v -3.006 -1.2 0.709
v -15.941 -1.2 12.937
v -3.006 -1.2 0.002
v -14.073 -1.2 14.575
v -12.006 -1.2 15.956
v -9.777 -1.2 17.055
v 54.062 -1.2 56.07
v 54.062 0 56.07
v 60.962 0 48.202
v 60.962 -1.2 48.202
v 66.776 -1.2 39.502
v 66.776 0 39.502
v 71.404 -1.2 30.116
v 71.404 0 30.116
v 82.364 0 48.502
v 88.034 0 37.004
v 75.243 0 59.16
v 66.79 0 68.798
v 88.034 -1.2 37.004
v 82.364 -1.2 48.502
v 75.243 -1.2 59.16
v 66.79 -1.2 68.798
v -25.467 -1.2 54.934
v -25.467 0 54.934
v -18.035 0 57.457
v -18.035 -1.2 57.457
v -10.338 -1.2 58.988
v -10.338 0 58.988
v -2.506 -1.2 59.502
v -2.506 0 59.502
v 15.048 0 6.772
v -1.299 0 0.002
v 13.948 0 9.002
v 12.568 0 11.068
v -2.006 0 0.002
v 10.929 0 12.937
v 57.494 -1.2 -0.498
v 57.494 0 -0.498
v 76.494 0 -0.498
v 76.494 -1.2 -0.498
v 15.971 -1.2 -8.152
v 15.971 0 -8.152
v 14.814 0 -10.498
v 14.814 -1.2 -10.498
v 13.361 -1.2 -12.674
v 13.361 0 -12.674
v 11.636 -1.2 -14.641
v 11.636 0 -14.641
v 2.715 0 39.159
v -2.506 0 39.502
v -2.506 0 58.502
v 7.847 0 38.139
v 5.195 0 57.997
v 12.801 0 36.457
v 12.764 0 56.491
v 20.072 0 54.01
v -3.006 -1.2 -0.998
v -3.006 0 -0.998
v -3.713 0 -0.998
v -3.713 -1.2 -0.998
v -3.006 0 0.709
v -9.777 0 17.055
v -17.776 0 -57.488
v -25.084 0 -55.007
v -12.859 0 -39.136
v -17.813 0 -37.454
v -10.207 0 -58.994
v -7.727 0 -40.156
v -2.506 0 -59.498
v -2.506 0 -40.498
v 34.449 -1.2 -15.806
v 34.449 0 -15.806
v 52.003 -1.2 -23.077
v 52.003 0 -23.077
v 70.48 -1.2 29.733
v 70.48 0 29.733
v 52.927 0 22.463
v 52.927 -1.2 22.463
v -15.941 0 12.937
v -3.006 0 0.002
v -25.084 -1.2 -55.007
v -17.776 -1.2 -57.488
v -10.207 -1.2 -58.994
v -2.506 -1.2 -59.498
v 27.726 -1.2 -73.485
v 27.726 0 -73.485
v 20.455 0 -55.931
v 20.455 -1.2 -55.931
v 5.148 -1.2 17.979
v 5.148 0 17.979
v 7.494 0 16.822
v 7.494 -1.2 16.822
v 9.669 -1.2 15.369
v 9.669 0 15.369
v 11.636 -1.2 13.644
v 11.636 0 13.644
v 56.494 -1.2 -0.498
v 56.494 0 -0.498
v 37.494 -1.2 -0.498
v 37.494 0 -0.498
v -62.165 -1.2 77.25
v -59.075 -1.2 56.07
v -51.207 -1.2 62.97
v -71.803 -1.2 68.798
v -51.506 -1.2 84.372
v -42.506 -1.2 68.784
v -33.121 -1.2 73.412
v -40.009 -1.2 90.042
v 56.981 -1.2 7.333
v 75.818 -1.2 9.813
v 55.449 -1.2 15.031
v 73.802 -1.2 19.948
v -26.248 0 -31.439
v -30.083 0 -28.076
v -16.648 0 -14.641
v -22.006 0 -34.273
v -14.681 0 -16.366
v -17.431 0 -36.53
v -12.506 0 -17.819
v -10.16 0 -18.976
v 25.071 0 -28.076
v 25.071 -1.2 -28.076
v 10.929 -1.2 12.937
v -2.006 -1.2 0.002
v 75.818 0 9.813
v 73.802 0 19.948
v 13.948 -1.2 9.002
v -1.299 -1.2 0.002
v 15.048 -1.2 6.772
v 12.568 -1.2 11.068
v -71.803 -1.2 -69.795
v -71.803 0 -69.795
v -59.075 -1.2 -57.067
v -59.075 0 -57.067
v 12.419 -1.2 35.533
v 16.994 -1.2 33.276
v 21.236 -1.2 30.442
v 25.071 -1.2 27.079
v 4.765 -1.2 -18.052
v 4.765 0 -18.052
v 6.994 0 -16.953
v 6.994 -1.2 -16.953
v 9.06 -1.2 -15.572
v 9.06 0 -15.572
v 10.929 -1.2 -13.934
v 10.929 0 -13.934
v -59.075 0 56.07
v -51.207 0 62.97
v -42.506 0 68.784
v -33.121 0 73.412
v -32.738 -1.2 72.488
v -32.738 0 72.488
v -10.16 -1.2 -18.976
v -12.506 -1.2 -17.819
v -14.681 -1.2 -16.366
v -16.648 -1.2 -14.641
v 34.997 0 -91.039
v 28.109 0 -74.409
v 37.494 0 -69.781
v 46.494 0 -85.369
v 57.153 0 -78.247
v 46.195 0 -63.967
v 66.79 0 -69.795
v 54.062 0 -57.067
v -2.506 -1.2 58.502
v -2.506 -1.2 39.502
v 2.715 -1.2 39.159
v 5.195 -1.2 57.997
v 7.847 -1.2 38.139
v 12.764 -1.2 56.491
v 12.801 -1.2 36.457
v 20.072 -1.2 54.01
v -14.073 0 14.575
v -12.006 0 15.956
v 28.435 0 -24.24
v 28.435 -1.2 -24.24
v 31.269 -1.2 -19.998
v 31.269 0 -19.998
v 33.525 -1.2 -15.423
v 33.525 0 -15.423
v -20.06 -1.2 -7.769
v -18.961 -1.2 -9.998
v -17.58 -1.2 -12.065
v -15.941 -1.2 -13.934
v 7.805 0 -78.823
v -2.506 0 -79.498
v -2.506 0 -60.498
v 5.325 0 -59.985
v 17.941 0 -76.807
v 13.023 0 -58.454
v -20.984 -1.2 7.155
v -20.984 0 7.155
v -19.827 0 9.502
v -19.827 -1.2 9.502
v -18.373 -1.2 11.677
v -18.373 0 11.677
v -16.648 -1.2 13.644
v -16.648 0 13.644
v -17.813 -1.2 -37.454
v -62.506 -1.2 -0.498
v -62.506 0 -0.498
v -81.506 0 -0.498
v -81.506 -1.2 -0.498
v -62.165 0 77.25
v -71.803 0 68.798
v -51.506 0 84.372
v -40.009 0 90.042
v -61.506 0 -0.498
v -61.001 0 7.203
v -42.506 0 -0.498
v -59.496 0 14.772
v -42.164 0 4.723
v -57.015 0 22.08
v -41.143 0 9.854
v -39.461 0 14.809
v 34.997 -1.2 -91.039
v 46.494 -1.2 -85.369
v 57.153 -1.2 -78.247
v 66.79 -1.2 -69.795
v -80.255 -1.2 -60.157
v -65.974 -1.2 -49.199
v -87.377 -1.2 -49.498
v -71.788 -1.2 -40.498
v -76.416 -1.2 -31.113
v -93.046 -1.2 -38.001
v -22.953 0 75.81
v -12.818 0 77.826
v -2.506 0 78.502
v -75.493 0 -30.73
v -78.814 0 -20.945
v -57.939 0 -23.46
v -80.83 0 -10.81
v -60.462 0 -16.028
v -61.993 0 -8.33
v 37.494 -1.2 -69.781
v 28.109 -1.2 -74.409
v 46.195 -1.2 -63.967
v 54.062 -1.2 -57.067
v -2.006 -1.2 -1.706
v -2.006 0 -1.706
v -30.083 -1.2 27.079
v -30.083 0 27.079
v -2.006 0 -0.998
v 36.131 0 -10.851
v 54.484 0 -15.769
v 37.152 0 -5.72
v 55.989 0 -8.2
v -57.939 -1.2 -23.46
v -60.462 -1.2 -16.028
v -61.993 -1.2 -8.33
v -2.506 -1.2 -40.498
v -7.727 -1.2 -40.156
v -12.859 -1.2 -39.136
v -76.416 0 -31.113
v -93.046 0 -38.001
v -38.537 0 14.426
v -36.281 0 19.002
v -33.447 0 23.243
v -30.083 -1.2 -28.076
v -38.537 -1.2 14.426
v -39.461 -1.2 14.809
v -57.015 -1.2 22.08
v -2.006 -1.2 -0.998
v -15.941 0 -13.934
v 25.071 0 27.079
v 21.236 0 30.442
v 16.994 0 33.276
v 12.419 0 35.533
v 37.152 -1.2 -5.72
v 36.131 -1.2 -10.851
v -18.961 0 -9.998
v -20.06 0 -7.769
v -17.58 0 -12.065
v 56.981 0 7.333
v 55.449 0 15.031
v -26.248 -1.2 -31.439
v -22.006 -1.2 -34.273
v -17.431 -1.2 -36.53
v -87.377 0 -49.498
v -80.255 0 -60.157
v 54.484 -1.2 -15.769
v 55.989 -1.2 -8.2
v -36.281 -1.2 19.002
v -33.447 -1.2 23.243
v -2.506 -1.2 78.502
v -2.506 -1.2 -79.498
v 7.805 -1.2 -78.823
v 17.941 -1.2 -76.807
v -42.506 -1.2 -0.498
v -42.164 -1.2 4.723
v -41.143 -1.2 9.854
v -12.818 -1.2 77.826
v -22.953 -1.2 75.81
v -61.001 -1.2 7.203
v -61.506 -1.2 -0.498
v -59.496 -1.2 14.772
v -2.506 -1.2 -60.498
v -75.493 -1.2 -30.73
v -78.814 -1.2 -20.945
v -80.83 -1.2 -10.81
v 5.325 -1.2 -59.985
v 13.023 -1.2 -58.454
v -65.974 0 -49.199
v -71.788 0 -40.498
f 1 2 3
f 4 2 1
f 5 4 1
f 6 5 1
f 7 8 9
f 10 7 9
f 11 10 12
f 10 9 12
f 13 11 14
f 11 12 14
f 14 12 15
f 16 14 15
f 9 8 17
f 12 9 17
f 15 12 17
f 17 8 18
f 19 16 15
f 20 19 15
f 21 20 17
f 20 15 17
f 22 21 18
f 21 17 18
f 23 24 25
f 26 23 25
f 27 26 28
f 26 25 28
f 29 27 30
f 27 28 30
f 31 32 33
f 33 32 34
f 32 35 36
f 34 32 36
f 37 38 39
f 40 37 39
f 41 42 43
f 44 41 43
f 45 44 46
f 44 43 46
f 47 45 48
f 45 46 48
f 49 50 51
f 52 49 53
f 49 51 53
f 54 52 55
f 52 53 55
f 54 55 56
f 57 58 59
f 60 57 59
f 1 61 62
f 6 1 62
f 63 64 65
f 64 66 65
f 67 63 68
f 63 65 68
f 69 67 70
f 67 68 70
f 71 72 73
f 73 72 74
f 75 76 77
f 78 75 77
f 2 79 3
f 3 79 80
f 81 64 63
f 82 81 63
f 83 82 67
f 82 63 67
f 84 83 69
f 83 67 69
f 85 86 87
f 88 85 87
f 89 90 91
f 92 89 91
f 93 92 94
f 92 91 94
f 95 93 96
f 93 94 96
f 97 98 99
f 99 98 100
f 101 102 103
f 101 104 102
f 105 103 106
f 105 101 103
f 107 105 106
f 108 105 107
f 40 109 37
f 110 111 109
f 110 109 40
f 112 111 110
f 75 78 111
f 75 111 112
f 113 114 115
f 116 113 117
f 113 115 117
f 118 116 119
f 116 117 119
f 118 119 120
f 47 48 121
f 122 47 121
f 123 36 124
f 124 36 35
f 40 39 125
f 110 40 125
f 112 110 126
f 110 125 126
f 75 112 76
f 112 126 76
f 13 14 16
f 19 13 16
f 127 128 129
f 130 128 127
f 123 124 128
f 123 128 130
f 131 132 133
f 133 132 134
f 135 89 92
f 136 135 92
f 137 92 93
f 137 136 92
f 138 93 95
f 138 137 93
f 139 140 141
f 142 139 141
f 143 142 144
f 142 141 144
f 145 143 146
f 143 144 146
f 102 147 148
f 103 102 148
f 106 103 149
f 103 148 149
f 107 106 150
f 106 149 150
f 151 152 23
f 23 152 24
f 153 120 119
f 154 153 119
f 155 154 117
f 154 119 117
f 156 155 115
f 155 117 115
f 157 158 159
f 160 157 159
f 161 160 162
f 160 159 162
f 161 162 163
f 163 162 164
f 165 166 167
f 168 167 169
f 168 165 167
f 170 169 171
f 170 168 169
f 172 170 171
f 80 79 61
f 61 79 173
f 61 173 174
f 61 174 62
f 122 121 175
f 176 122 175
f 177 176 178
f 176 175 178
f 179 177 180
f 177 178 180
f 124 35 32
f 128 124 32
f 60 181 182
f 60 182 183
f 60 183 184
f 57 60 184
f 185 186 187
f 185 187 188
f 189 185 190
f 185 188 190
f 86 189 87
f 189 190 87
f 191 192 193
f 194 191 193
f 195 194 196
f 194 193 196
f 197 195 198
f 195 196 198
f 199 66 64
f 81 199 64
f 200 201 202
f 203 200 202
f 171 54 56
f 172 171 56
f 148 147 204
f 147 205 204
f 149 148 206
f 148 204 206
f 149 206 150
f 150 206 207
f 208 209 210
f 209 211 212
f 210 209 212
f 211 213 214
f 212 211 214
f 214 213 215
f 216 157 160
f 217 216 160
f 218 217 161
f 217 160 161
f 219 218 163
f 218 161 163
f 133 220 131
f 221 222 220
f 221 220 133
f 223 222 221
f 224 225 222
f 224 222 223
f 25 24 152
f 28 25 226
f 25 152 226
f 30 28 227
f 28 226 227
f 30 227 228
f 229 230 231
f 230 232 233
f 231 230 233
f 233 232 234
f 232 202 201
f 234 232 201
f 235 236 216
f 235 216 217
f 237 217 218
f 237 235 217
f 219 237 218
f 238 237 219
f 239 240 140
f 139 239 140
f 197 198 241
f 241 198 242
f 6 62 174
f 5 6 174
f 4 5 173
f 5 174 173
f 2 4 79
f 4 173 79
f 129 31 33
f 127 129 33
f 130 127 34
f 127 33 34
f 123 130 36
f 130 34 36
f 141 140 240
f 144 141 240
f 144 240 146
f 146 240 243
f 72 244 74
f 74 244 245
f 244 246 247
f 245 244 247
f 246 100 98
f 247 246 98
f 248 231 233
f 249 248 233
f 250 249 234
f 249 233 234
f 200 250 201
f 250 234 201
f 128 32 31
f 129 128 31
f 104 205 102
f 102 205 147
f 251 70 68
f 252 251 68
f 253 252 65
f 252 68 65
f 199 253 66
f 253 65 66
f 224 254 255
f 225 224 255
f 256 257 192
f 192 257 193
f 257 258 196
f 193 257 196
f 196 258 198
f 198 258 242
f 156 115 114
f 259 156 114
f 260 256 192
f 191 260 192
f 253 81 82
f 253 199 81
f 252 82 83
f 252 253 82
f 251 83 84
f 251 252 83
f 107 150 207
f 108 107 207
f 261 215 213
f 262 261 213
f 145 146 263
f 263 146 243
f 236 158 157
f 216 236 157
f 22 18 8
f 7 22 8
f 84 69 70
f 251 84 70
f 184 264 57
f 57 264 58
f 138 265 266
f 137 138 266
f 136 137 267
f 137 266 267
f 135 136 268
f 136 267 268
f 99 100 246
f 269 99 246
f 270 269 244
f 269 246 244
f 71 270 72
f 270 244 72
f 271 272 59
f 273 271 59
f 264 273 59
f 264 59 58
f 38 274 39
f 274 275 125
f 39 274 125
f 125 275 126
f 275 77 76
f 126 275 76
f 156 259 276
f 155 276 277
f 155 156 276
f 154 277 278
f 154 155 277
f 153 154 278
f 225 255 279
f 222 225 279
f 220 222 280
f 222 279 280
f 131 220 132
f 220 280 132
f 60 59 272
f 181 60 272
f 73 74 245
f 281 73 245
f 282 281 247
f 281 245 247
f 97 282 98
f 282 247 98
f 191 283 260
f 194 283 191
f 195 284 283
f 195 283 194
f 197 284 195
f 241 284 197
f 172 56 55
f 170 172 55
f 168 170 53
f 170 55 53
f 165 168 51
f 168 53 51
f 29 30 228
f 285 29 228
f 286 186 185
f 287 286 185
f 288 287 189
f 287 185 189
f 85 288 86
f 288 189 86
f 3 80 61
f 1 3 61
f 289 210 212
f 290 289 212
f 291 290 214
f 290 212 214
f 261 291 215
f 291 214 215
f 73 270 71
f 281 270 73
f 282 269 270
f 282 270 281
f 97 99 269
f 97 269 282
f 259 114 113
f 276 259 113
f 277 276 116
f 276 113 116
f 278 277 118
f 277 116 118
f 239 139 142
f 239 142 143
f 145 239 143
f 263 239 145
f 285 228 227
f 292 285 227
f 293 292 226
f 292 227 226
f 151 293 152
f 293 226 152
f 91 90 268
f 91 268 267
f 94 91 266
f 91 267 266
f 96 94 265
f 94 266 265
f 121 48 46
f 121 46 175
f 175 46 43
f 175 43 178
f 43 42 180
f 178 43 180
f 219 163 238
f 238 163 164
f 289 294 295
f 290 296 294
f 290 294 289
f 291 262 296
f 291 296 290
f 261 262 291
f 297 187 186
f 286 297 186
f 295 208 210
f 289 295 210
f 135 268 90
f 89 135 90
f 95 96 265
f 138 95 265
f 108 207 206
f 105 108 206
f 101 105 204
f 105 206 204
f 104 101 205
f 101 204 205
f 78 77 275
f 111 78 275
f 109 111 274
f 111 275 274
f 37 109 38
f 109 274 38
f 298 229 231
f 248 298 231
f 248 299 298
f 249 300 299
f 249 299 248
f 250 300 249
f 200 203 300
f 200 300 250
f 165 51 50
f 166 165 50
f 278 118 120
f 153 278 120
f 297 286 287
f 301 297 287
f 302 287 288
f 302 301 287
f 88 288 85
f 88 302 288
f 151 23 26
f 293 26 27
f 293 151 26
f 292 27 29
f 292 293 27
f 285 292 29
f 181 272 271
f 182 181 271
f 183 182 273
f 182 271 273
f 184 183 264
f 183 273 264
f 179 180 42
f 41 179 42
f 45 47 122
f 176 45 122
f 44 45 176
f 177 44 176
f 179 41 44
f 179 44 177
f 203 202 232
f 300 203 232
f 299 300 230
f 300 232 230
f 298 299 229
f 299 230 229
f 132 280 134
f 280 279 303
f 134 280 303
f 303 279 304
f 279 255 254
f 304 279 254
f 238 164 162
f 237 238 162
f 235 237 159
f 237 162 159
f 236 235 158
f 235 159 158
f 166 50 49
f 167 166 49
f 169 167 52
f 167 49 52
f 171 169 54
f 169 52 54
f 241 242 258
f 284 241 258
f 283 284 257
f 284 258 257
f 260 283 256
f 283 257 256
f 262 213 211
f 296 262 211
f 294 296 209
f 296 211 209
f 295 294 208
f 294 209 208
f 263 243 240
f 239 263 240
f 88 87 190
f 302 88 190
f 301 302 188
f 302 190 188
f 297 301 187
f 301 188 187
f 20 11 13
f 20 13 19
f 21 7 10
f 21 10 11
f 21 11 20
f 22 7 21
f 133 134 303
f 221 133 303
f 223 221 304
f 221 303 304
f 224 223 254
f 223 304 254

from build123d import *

# Parameters (mm, degrees)
F1_DEPTH = 1.2


# Not quite as in the source:
# - ends of sketch curves that miss each other by under 0.0002 mm in the source are joined


with BuildPart() as f1:
    # F0 (on Front) → F1 (new body)
    with BuildSketch(Plane.XZ):
        with BuildLine():
            Line((-1.2989994546, 0.0015044786), (15.0476048994, 6.7724896142))
            ThreePointArc((15.0476048994, 6.7724896142), (13.2918164287, 10.0573388369), (10.928922648, 12.9365332644))
            Line((10.928922648, 12.9365332644), (-2.0061062491, 0.0015044765))
            Line((-2.0061062498, 0.0015044786), (-1.2989994546, 0.0015044786))
        make_face()
    extrude(amount=F1_DEPTH)


with BuildPart() as f1b:
    # F0 (on Front) → F1, piece 2 (new body)
    with BuildSketch(Plane.XZ):
        with BuildLine():
            Line((11.6360294322, 13.6436400426), (25.0710583314, 27.0786688285))
            ThreePointArc((25.0710583314, 27.0786688285), (19.1611329685, 31.9288192702), (12.4185477522, 35.532806188))
            Line((12.4185477522, 35.532806188), (5.1475624685, 17.9790950988))
            ThreePointArc((5.1475624685, 17.9790950988), (8.6052984769, 16.1308966794), (11.6360294322, 13.6436400426))
        make_face()
    extrude(amount=F1_DEPTH)


with BuildPart() as f1c:
    # F0 (on Front) → F1, piece 3 (new body)
    with BuildSketch(Plane.XZ):
        with BuildLine():
            Line((12.8012311882, 36.4566857191), (20.0722164719, 54.0103968083))
            ThreePointArc((20.0722164719, 54.0103968083), (9.0042229134, 57.3678359894), (-2.5061061445, 58.5015044786))
            Line((-2.5061061445, 58.5015044786), (-2.5061062512, 39.5015044786))
            ThreePointArc((-2.5061062512, 39.5015044786), (5.2975067418, 38.7329156724), (12.8012311882, 36.4566857191))
        make_face()
    extrude(amount=F1_DEPTH)


with BuildPart() as f1d:
    # F0 (on Front) → F1, piece 4 (new body)
    with BuildSketch(Plane.XZ):
        with BuildLine():
            Line((-2.5061062512, 59.5015044786), (-2.5061062512, 78.5015044786))
            ThreePointArc((-2.5061062512, 78.5015044786), (-17.918241492, 76.9835416699), (-32.7380971661, 72.4879876471))
            Line((-32.7380971661, 72.4879876471), (-25.4671120094, 54.9342765053))
            ThreePointArc((-25.4671120094, 54.9342765053), (-14.2115254214, 58.3486213327), (-2.5061062512, 59.5015044786))
        make_face()
    extrude(amount=F1_DEPTH)


with BuildPart() as f1e:
    # F0 (on Front) → F1, piece 5 (new body)
    with BuildSketch(Plane.XZ):
        with BuildLine():
            ThreePointArc((-59.0746485757, 56.0700471439), (-46.9517246823, 66.0190736034), (-33.1207805954, 73.4118671809))
            Line((-33.1207805954, 73.4118671809), (-40.0090823229, 90.041698789))
            ThreePointArc((-40.0090823229, 90.041698789), (-56.9519888293, 80.9855266564), (-71.8025705987, 68.7979692436))
            Line((-71.8025705987, 68.7979692436), (-59.0746485757, 56.0700471439))
        make_face()
    extrude(amount=F1_DEPTH)


with BuildPart() as f1f:
    # F0 (on Front) → F1, piece 6 (new body)
    with BuildSketch(Plane.XZ):
        with BuildLine():
            Line((-15.9411350532, 12.9365333616), (-3.0061062497, 0.0015044801))
            Line((-3.0061062512, 0.0015044796), (-3.0061062512, 0.7086112711))
            Line((-3.0061062512, 0.7086112711), (-9.7770914079, 17.0552156204))
            ThreePointArc((-9.7770914079, 17.0552156204), (-13.0619406286, 15.2994271457), (-15.9411350532, 12.9365333616))
        make_face()
    extrude(amount=F1_DEPTH)


with BuildPart() as f1g:
    # F0 (on Front) → F1, piece 7 (new body)
    with BuildSketch(Plane.XZ):
        with BuildLine():
            Line((-16.6482418323, 13.6436401449), (-30.0832706344, 27.0786690279))
            ThreePointArc((-30.0832706344, 27.0786690279), (-34.933421069, 21.1687436591), (-38.5374079786, 14.4261584385))
            Line((-38.5374079786, 14.4261584385), (-20.9836968806, 7.155173176))
            ThreePointArc((-20.9836968806, 7.155173176), (-19.1354984654, 10.6129091865), (-16.6482418323, 13.6436401449))
        make_face()
    extrude(amount=F1_DEPTH)


with BuildPart() as f1h:
    # F0 (on Front) → F1, piece 8 (new body)
    with BuildSketch(Plane.XZ):
        with BuildLine():
            Line((-39.4612875101, 14.8088418734), (-57.0149986081, 22.0798271359))
            ThreePointArc((-57.0149986081, 22.0798271359), (-60.3724377655, 11.0118336257), (-61.5061062512, -0.4984953792))
            Line((-61.5061062512, -0.4984953792), (-42.5061062512, -0.498495425))
            ThreePointArc((-42.5061062512, -0.498495425), (-41.7375174473, 7.3051174597), (-39.4612875101, 14.8088418734))
        make_face()
    extrude(amount=F1_DEPTH)


with BuildPart() as f1i:
    # F0 (on Front) → F1, piece 9 (new body)
    with BuildSketch(Plane.XZ):
        with BuildLine():
            ThreePointArc((-81.5061062512, -0.498495331), (-79.9881434379, -15.9106307856), (-75.4925893833, -30.7304865244))
            Line((-75.4925893833, -30.7304865244), (-57.9388782503, -23.4595013464))
            ThreePointArc((-57.9388782503, -23.4595013464), (-61.3532231018, -12.2039147094), (-62.5061062512, -0.4984953768))
            Line((-62.5061062512, -0.4984953768), (-81.5061062512, -0.498495331))
        make_face()
    extrude(amount=F1_DEPTH)


with BuildPart() as f1j:
    # F0 (on Front) → F1, piece 10 (new body)
    with BuildSketch(Plane.XZ):
        with BuildLine():
            Line((-71.8025709327, -69.7949599525), (-59.0746488484, -57.0670379141))
            ThreePointArc((-59.0746488484, -57.0670379141), (-69.0236753224, -44.9441140327), (-76.4164689166, -31.1131699548))
            Line((-76.4164689166, -31.1131699548), (-93.0463005164, -38.0014717023))
            ThreePointArc((-93.0463005164, -38.0014717023), (-83.9901283634, -54.9443781978), (-71.8025709327, -69.7949599525))
        make_face()
    extrude(amount=F1_DEPTH)


with BuildPart() as f1k:
    # F0 (on Front) → F1, piece 11 (new body)
    with BuildSketch(Plane.XZ):
        with BuildLine():
            Line((-15.941135118, -13.9335243397), (-3.0061062521, -0.9984955205))
            Line((-3.0061062518, -0.9984955214), (-3.7132130396, -0.9984955214))
            Line((-3.7132130396, -0.9984955214), (-20.0598173842, -7.7694806994))
            ThreePointArc((-20.0598173842, -7.7694806994), (-18.3040289056, -11.0543299179), (-15.941135118, -13.9335243397))
        make_face()
    extrude(amount=F1_DEPTH)


with BuildPart() as f1l:
    # F0 (on Front) → F1, piece 12 (new body)
    with BuildSketch(Plane.XZ):
        with BuildLine():
            ThreePointArc((-30.0832707673, -28.0756599379), (-24.1733453927, -32.9258103653), (-17.4307601677, -36.5297972669))
            Line((-17.4307601677, -36.5297972669), (-10.1597749263, -18.9760861601))
            ThreePointArc((-10.1597749263, -18.9760861601), (-13.6175109391, -17.1278877491), (-16.6482419005, -14.6406311196))
            Line((-16.6482419005, -14.6406311196), (-30.0832707673, -28.0756599379))
        make_face()
    extrude(amount=F1_DEPTH)


with BuildPart() as f1m:
    # F0 (on Front) → F1, piece 13 (new body)
    with BuildSketch(Plane.XZ):
        with BuildLine():
            ThreePointArc((-25.0844288428, -55.0073879056), (-14.0164353111, -58.3648270531), (-2.5061062867, -59.4984955214))
            Line((-2.5061062512, -59.4984955214), (-2.5061062512, -40.4984955214))
            ThreePointArc((-2.5061062753, -40.4984955214), (-10.3097191732, -39.7299067293), (-17.8134436014, -37.4536767988))
            Line((-17.8134436014, -37.4536767988), (-25.0844288428, -55.0073879056))
        make_face()
    extrude(amount=F1_DEPTH)


with BuildPart() as f1n:
    # F0 (on Front) → F1, piece 14 (new body)
    with BuildSketch(Plane.XZ):
        with BuildLine():
            ThreePointArc((-2.5061062988, -79.4984955214), (12.9060291297, -77.9805326849), (27.7258848397, -73.4849786172))
            Line((27.7258848397, -73.4849786172), (20.4548996406, -55.9312674929))
            ThreePointArc((20.4548996406, -55.9312674929), (9.1993130255, -59.3456123544), (-2.5061062873, -60.4984955214))
            Line((-2.5061062512, -60.4984955214), (-2.5061062512, -79.4984955214))
        make_face()
    extrude(amount=F1_DEPTH)


with BuildPart() as f1o:
    # F0 (on Front) → F1, piece 15 (new body)
    with BuildSketch(Plane.XZ):
        with BuildLine():
            Line((66.7903582634, -69.7949601195), (54.0624362097, -57.0670380504))
            ThreePointArc((54.0624362097, -57.0670380504), (41.9395123403, -67.0160645391), (28.1085682712, -74.40885815))
            Line((28.1085682712, -74.40885815), (34.9968700388, -91.0386897414))
            ThreePointArc((34.9968700388, -91.0386897414), (51.9397765234, -81.9825175681), (66.7903582634, -69.7949601195))
        make_face()
    extrude(amount=F1_DEPTH)


with BuildPart() as f1p:
    # F0 (on Front) → F1, piece 16 (new body)
    with BuildSketch(Plane.XZ):
        with BuildLine():
            ThreePointArc((4.7648789479, -18.0522066457), (8.0497281643, -16.2964181631), (10.9289225833, -13.9335243721))
            Line((10.9289225833, -13.9335243721), (-2.0061062515, -0.9984955217))
            Line((-2.0061062512, -0.9984955216), (-2.0061062512, -1.7056023057))
            Line((-2.0061062512, -1.7056023057), (4.7648789479, -18.0522066457))
        make_face()
    extrude(amount=F1_DEPTH)


with BuildPart() as f1q:
    # F0 (on Front) → F1, piece 17 (new body)
    with BuildSketch(Plane.XZ):
        with BuildLine():
            ThreePointArc((25.0710581985, -28.0756600043), (29.9212086188, -22.1657346239), (33.5251955123, -15.4231493945))
            Line((33.5251955123, -15.4231493945), (15.9714843967, -8.1521641743))
            ThreePointArc((15.9714843967, -8.1521641743), (14.1232859899, -11.6099001893), (11.636029364, -14.6406311537))
            Line((11.636029364, -14.6406311537), (25.0710581985, -28.0756600043))
        make_face()
    extrude(amount=F1_DEPTH)


with BuildPart() as f1r:
    # F0 (on Front) → F1, piece 18 (new body)
    with BuildSketch(Plane.XZ):
        with BuildLine():
            ThreePointArc((52.0027861602, -23.0768180474), (55.3602252909, -12.0088245291), (56.4938937488, -0.4984955214))
            Line((56.4938937488, -0.4984955214), (37.4938937488, -0.4984955214))
            ThreePointArc((37.4938937488, -0.4984955214), (36.7253049638, -8.302108408), (34.4490750447, -15.8058328272))
            Line((34.4490750447, -15.8058328272), (52.0027861602, -23.0768180474))
        make_face()
    extrude(amount=F1_DEPTH)


with BuildPart() as f1s:
    # F0 (on Front) → F1, piece 19 (new body)
    with BuildSketch(Plane.XZ):
        with BuildLine():
            Line((57.4938937488, -0.4984955214), (76.4938937488, -0.4984955214))
            ThreePointArc((76.4938937488, -0.4984955214), (74.9759309355, 14.9136397428), (70.4803769538, 29.7334953056))
            Line((70.4803769538, 29.7334953056), (52.9266658033, 22.46251017))
            ThreePointArc((52.9266658033, 22.46251017), (56.3410105995, 11.2069236666), (57.4938937488, -0.4984955214))
        make_face()
    extrude(amount=F1_DEPTH)


with BuildPart() as f1t:
    # F0 (on Front) → F1, piece 20 (new body)
    with BuildSketch(Plane.XZ):
        with BuildLine():
            ThreePointArc((54.0624364823, 56.0700467349), (64.0114629272, 43.9471228295), (71.4042564881, 30.1161787338))
            Line((71.4042564881, 30.1161787338), (88.0340881044, 37.0044804412))
            ThreePointArc((88.0340881044, 37.0044804412), (78.9779159923, 53.9473869585), (66.7903585974, 68.7979687426))
            Line((66.7903585974, 68.7979687426), (54.0624364823, 56.0700467349))
        make_face()
    extrude(amount=F1_DEPTH)


solid = Compound([f1.part, f1b.part, f1c.part, f1d.part, f1e.part, f1f.part, f1g.part, f1h.part, f1i.part, f1j.part, f1k.part, f1l.part, f1m.part, f1n.part, f1o.part, f1p.part, f1q.part, f1r.part, f1s.part, f1t.part])
